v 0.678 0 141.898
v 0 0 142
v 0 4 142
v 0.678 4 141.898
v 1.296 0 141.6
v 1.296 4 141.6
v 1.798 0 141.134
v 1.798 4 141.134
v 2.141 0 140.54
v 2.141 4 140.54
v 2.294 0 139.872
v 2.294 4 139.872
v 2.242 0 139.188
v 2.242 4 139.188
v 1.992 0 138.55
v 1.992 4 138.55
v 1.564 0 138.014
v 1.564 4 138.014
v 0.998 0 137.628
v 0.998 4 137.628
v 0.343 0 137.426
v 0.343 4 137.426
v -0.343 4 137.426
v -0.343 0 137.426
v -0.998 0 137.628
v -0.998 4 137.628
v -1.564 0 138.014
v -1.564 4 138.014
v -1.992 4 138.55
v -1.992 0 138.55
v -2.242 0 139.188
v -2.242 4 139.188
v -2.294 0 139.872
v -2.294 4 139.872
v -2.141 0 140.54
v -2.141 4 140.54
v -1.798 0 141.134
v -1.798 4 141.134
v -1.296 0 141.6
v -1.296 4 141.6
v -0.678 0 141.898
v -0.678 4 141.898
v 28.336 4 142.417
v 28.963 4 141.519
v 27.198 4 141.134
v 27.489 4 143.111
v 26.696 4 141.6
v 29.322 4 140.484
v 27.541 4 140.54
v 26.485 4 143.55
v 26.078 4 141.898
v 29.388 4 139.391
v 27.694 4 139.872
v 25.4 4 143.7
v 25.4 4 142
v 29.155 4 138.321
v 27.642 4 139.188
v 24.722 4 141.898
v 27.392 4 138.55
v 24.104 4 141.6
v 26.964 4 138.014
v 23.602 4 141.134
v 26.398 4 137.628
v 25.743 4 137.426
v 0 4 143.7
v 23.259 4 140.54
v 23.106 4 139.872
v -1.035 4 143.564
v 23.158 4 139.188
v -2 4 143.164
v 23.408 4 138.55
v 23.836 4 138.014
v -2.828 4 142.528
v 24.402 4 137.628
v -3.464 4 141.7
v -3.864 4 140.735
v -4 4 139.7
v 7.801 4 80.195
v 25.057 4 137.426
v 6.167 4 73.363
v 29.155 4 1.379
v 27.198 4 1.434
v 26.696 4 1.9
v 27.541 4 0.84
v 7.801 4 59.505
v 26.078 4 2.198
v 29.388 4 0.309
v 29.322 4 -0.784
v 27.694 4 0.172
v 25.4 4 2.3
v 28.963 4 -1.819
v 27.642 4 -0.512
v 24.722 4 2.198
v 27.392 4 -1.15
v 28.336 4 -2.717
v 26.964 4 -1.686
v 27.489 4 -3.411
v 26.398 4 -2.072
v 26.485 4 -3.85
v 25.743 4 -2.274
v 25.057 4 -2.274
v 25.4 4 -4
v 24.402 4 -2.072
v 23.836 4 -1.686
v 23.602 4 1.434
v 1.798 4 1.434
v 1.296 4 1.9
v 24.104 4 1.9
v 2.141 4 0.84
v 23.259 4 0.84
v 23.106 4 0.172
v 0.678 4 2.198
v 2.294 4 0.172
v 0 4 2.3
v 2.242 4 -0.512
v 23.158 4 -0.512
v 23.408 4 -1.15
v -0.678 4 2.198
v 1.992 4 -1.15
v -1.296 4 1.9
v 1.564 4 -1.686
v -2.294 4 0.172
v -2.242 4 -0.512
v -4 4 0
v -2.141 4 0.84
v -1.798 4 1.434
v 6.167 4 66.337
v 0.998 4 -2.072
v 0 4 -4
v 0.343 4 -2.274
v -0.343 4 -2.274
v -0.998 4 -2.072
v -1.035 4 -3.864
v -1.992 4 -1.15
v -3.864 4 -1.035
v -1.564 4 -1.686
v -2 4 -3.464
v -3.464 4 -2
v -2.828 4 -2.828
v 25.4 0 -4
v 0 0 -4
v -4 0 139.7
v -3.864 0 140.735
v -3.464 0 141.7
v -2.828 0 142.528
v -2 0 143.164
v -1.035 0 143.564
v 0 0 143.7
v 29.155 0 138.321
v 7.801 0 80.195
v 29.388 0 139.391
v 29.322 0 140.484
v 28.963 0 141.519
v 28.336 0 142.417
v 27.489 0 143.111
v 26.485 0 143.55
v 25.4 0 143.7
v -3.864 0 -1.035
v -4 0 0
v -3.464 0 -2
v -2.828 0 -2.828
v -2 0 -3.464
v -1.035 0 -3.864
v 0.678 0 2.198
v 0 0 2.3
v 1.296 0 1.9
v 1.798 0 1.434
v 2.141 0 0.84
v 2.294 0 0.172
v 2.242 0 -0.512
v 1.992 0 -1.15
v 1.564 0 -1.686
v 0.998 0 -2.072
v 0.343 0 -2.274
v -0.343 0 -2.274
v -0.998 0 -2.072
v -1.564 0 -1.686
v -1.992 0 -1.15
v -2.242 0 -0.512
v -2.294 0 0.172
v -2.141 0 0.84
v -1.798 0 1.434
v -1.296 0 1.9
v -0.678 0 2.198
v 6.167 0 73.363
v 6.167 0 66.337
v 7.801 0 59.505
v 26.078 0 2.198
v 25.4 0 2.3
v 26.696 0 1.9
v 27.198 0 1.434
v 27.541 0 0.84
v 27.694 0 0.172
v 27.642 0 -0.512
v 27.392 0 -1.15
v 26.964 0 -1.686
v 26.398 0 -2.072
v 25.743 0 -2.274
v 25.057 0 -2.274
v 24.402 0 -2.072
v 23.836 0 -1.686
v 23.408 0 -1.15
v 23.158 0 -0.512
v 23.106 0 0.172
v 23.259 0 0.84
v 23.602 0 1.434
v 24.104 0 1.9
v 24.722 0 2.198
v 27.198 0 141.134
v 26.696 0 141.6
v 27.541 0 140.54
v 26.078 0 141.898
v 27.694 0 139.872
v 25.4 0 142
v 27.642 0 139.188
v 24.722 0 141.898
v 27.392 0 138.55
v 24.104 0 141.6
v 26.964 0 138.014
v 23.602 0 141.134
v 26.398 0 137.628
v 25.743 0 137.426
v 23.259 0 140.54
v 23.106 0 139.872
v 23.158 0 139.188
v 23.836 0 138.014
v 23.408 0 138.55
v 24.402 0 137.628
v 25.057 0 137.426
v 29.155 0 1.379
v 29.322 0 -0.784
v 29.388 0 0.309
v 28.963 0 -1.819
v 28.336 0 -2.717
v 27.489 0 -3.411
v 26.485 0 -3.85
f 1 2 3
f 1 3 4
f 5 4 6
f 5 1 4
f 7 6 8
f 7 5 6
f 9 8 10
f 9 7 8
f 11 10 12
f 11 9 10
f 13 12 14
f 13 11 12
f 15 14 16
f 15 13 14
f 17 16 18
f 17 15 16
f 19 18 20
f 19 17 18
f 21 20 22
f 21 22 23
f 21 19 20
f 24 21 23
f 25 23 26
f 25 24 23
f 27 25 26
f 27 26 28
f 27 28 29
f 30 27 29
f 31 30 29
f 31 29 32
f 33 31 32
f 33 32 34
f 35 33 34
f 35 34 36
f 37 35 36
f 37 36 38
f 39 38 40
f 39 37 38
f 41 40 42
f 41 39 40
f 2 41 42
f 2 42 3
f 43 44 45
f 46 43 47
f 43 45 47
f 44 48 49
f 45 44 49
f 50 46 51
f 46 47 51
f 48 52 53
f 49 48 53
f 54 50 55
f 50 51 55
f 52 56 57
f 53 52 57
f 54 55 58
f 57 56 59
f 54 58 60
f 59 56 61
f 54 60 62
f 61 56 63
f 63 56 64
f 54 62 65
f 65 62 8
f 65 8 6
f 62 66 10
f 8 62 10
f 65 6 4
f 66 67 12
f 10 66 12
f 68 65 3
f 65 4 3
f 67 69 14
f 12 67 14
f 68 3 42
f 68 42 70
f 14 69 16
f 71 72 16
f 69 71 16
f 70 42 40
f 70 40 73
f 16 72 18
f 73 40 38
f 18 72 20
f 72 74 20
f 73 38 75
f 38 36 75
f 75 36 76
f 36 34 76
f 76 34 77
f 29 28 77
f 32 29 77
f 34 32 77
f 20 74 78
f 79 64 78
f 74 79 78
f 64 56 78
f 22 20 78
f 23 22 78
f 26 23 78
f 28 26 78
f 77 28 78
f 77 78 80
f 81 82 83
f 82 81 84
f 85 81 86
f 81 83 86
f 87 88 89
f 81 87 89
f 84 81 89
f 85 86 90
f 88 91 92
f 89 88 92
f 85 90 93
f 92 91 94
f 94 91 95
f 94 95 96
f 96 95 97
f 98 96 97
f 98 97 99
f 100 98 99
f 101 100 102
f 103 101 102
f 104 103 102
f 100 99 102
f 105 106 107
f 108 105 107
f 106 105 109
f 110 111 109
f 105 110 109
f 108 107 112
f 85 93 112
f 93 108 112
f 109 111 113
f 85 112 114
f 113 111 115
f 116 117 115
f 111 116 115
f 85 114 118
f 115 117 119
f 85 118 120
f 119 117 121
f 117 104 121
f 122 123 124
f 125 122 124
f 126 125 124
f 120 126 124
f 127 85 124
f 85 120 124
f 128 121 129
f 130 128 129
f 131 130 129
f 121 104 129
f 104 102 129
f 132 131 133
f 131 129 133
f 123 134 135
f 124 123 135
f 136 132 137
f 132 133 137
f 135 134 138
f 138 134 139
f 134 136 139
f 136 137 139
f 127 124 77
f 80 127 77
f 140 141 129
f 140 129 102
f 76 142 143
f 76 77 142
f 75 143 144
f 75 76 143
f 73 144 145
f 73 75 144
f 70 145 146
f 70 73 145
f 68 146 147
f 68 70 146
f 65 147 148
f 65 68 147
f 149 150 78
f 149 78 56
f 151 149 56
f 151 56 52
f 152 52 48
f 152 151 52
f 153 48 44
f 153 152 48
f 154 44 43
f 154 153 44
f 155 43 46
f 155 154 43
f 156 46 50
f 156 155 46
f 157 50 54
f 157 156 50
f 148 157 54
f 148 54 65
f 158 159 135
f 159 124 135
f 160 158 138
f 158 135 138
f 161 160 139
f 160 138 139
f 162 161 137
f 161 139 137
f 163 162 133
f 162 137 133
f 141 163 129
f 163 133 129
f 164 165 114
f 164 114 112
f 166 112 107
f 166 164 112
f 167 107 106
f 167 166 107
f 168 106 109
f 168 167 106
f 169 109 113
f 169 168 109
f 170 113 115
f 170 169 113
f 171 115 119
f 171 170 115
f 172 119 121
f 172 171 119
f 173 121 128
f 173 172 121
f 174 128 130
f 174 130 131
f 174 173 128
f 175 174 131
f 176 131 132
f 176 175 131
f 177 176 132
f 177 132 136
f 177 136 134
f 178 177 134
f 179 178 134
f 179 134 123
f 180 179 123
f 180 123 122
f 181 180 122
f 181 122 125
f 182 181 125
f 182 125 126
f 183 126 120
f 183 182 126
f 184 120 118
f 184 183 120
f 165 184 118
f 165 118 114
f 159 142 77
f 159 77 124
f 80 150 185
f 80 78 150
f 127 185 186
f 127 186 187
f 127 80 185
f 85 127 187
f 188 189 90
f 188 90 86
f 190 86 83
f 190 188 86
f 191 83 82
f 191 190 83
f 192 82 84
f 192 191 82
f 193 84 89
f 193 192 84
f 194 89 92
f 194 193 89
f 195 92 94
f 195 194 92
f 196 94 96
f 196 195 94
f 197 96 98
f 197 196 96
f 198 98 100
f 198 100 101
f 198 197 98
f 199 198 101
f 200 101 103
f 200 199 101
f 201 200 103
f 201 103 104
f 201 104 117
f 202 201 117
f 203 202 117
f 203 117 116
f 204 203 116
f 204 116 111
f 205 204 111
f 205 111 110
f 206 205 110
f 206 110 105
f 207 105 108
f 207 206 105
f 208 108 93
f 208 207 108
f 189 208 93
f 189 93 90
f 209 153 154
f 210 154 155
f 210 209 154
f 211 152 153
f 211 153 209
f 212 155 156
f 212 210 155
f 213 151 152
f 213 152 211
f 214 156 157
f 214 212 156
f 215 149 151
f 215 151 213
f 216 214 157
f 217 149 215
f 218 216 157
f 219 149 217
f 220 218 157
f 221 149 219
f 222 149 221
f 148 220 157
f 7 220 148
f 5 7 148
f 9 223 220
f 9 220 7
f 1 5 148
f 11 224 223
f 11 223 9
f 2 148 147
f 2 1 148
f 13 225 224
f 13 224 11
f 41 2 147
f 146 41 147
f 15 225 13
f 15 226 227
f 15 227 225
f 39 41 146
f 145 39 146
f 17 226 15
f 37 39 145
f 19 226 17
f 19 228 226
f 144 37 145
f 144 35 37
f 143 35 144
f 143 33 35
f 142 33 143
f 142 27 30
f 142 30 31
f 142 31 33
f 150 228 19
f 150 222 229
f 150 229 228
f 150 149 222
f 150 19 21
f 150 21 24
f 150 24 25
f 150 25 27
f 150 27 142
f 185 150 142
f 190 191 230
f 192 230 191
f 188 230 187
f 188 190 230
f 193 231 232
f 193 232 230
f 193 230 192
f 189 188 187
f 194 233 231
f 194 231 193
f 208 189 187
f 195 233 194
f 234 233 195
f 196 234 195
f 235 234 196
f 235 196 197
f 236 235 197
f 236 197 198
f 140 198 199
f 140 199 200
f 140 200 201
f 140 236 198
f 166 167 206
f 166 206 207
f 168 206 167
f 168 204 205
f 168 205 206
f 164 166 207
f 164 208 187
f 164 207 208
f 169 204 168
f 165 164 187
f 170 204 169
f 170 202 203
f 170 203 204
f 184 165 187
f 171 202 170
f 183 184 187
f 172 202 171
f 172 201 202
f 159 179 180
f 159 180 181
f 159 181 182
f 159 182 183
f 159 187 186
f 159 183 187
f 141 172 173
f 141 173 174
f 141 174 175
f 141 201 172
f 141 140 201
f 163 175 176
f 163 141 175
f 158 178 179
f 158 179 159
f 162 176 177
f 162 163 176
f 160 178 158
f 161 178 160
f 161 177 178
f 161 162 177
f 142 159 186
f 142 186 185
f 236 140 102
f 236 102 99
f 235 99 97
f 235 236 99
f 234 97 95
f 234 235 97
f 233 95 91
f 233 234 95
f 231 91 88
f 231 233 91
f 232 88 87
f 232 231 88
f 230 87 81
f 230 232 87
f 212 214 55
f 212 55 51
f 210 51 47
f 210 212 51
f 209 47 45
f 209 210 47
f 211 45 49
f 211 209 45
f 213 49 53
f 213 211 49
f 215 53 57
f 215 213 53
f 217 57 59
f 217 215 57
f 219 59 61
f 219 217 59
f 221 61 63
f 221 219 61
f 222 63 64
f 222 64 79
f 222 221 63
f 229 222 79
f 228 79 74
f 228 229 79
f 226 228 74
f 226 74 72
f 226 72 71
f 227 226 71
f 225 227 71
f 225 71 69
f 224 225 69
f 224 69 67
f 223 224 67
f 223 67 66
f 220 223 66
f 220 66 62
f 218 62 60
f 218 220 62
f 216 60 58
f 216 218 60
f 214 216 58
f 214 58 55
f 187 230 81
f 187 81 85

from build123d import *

# Parameters (mm, degrees)
SKETCH1_R           = 2.3
BOSS_EXTRUDE2_DEPTH = 4
FILLET1_R           = 4
FILLET2_R           = 30


with BuildPart() as part:
    # Sketch1 → Boss-Extrude2 (new body)
    with BuildSketch(Plane(origin=(0, 0, 0), x_dir=(1, 0, 0), z_dir=(0, 1, 0))):
        with BuildLine():
            Line((-4, -143.7), (-4, 4))
            Line((-4, 4), (25.4, 4))
            ThreePointArc((25.4, 4), (28.6800532, 2.289377864), (29.154640594, -1.379374498))
            Line((29.154640594, -1.379374498), (4, -69.85))
            Line((4, -69.85), (29.154640594, -138.320625502))
            ThreePointArc((29.154640594, -138.320625502), (28.6800532, -141.989377864), (25.4, -143.7))
            Line((25.4, -143.7), (-4, -143.7))
        make_face()
        with Locations(Location((0, 0, 0), (0, 0, 270))):
            Circle(SKETCH1_R, mode=Mode.SUBTRACT)
        with Locations(Location((25.4, 0, 0), (0, 0, 270))):
            Circle(SKETCH1_R, mode=Mode.SUBTRACT)
        with Locations(Location((25.4, -139.7, 0), (0, 0, 270))):
            Circle(SKETCH1_R, mode=Mode.SUBTRACT)
        with Locations(Location((0, -139.7, 0), (0, 0, 270))):
            Circle(SKETCH1_R, mode=Mode.SUBTRACT)
    extrude(amount=BOSS_EXTRUDE2_DEPTH)

    # Fillet1
    fillet1_edges = [part.edges().sort_by_distance(p)[0] for p in [
        (-4, 2, 143.7),
        (-4, 2, -4),
    ]]
    fillet(fillet1_edges, radius=FILLET1_R)

    # Fillet2
    fillet2_edges = [part.edges().sort_by_distance(p)[0] for p in [
        (4, 2, 69.85),
    ]]
    fillet(fillet2_edges, radius=FILLET2_R)


solid = part.part
